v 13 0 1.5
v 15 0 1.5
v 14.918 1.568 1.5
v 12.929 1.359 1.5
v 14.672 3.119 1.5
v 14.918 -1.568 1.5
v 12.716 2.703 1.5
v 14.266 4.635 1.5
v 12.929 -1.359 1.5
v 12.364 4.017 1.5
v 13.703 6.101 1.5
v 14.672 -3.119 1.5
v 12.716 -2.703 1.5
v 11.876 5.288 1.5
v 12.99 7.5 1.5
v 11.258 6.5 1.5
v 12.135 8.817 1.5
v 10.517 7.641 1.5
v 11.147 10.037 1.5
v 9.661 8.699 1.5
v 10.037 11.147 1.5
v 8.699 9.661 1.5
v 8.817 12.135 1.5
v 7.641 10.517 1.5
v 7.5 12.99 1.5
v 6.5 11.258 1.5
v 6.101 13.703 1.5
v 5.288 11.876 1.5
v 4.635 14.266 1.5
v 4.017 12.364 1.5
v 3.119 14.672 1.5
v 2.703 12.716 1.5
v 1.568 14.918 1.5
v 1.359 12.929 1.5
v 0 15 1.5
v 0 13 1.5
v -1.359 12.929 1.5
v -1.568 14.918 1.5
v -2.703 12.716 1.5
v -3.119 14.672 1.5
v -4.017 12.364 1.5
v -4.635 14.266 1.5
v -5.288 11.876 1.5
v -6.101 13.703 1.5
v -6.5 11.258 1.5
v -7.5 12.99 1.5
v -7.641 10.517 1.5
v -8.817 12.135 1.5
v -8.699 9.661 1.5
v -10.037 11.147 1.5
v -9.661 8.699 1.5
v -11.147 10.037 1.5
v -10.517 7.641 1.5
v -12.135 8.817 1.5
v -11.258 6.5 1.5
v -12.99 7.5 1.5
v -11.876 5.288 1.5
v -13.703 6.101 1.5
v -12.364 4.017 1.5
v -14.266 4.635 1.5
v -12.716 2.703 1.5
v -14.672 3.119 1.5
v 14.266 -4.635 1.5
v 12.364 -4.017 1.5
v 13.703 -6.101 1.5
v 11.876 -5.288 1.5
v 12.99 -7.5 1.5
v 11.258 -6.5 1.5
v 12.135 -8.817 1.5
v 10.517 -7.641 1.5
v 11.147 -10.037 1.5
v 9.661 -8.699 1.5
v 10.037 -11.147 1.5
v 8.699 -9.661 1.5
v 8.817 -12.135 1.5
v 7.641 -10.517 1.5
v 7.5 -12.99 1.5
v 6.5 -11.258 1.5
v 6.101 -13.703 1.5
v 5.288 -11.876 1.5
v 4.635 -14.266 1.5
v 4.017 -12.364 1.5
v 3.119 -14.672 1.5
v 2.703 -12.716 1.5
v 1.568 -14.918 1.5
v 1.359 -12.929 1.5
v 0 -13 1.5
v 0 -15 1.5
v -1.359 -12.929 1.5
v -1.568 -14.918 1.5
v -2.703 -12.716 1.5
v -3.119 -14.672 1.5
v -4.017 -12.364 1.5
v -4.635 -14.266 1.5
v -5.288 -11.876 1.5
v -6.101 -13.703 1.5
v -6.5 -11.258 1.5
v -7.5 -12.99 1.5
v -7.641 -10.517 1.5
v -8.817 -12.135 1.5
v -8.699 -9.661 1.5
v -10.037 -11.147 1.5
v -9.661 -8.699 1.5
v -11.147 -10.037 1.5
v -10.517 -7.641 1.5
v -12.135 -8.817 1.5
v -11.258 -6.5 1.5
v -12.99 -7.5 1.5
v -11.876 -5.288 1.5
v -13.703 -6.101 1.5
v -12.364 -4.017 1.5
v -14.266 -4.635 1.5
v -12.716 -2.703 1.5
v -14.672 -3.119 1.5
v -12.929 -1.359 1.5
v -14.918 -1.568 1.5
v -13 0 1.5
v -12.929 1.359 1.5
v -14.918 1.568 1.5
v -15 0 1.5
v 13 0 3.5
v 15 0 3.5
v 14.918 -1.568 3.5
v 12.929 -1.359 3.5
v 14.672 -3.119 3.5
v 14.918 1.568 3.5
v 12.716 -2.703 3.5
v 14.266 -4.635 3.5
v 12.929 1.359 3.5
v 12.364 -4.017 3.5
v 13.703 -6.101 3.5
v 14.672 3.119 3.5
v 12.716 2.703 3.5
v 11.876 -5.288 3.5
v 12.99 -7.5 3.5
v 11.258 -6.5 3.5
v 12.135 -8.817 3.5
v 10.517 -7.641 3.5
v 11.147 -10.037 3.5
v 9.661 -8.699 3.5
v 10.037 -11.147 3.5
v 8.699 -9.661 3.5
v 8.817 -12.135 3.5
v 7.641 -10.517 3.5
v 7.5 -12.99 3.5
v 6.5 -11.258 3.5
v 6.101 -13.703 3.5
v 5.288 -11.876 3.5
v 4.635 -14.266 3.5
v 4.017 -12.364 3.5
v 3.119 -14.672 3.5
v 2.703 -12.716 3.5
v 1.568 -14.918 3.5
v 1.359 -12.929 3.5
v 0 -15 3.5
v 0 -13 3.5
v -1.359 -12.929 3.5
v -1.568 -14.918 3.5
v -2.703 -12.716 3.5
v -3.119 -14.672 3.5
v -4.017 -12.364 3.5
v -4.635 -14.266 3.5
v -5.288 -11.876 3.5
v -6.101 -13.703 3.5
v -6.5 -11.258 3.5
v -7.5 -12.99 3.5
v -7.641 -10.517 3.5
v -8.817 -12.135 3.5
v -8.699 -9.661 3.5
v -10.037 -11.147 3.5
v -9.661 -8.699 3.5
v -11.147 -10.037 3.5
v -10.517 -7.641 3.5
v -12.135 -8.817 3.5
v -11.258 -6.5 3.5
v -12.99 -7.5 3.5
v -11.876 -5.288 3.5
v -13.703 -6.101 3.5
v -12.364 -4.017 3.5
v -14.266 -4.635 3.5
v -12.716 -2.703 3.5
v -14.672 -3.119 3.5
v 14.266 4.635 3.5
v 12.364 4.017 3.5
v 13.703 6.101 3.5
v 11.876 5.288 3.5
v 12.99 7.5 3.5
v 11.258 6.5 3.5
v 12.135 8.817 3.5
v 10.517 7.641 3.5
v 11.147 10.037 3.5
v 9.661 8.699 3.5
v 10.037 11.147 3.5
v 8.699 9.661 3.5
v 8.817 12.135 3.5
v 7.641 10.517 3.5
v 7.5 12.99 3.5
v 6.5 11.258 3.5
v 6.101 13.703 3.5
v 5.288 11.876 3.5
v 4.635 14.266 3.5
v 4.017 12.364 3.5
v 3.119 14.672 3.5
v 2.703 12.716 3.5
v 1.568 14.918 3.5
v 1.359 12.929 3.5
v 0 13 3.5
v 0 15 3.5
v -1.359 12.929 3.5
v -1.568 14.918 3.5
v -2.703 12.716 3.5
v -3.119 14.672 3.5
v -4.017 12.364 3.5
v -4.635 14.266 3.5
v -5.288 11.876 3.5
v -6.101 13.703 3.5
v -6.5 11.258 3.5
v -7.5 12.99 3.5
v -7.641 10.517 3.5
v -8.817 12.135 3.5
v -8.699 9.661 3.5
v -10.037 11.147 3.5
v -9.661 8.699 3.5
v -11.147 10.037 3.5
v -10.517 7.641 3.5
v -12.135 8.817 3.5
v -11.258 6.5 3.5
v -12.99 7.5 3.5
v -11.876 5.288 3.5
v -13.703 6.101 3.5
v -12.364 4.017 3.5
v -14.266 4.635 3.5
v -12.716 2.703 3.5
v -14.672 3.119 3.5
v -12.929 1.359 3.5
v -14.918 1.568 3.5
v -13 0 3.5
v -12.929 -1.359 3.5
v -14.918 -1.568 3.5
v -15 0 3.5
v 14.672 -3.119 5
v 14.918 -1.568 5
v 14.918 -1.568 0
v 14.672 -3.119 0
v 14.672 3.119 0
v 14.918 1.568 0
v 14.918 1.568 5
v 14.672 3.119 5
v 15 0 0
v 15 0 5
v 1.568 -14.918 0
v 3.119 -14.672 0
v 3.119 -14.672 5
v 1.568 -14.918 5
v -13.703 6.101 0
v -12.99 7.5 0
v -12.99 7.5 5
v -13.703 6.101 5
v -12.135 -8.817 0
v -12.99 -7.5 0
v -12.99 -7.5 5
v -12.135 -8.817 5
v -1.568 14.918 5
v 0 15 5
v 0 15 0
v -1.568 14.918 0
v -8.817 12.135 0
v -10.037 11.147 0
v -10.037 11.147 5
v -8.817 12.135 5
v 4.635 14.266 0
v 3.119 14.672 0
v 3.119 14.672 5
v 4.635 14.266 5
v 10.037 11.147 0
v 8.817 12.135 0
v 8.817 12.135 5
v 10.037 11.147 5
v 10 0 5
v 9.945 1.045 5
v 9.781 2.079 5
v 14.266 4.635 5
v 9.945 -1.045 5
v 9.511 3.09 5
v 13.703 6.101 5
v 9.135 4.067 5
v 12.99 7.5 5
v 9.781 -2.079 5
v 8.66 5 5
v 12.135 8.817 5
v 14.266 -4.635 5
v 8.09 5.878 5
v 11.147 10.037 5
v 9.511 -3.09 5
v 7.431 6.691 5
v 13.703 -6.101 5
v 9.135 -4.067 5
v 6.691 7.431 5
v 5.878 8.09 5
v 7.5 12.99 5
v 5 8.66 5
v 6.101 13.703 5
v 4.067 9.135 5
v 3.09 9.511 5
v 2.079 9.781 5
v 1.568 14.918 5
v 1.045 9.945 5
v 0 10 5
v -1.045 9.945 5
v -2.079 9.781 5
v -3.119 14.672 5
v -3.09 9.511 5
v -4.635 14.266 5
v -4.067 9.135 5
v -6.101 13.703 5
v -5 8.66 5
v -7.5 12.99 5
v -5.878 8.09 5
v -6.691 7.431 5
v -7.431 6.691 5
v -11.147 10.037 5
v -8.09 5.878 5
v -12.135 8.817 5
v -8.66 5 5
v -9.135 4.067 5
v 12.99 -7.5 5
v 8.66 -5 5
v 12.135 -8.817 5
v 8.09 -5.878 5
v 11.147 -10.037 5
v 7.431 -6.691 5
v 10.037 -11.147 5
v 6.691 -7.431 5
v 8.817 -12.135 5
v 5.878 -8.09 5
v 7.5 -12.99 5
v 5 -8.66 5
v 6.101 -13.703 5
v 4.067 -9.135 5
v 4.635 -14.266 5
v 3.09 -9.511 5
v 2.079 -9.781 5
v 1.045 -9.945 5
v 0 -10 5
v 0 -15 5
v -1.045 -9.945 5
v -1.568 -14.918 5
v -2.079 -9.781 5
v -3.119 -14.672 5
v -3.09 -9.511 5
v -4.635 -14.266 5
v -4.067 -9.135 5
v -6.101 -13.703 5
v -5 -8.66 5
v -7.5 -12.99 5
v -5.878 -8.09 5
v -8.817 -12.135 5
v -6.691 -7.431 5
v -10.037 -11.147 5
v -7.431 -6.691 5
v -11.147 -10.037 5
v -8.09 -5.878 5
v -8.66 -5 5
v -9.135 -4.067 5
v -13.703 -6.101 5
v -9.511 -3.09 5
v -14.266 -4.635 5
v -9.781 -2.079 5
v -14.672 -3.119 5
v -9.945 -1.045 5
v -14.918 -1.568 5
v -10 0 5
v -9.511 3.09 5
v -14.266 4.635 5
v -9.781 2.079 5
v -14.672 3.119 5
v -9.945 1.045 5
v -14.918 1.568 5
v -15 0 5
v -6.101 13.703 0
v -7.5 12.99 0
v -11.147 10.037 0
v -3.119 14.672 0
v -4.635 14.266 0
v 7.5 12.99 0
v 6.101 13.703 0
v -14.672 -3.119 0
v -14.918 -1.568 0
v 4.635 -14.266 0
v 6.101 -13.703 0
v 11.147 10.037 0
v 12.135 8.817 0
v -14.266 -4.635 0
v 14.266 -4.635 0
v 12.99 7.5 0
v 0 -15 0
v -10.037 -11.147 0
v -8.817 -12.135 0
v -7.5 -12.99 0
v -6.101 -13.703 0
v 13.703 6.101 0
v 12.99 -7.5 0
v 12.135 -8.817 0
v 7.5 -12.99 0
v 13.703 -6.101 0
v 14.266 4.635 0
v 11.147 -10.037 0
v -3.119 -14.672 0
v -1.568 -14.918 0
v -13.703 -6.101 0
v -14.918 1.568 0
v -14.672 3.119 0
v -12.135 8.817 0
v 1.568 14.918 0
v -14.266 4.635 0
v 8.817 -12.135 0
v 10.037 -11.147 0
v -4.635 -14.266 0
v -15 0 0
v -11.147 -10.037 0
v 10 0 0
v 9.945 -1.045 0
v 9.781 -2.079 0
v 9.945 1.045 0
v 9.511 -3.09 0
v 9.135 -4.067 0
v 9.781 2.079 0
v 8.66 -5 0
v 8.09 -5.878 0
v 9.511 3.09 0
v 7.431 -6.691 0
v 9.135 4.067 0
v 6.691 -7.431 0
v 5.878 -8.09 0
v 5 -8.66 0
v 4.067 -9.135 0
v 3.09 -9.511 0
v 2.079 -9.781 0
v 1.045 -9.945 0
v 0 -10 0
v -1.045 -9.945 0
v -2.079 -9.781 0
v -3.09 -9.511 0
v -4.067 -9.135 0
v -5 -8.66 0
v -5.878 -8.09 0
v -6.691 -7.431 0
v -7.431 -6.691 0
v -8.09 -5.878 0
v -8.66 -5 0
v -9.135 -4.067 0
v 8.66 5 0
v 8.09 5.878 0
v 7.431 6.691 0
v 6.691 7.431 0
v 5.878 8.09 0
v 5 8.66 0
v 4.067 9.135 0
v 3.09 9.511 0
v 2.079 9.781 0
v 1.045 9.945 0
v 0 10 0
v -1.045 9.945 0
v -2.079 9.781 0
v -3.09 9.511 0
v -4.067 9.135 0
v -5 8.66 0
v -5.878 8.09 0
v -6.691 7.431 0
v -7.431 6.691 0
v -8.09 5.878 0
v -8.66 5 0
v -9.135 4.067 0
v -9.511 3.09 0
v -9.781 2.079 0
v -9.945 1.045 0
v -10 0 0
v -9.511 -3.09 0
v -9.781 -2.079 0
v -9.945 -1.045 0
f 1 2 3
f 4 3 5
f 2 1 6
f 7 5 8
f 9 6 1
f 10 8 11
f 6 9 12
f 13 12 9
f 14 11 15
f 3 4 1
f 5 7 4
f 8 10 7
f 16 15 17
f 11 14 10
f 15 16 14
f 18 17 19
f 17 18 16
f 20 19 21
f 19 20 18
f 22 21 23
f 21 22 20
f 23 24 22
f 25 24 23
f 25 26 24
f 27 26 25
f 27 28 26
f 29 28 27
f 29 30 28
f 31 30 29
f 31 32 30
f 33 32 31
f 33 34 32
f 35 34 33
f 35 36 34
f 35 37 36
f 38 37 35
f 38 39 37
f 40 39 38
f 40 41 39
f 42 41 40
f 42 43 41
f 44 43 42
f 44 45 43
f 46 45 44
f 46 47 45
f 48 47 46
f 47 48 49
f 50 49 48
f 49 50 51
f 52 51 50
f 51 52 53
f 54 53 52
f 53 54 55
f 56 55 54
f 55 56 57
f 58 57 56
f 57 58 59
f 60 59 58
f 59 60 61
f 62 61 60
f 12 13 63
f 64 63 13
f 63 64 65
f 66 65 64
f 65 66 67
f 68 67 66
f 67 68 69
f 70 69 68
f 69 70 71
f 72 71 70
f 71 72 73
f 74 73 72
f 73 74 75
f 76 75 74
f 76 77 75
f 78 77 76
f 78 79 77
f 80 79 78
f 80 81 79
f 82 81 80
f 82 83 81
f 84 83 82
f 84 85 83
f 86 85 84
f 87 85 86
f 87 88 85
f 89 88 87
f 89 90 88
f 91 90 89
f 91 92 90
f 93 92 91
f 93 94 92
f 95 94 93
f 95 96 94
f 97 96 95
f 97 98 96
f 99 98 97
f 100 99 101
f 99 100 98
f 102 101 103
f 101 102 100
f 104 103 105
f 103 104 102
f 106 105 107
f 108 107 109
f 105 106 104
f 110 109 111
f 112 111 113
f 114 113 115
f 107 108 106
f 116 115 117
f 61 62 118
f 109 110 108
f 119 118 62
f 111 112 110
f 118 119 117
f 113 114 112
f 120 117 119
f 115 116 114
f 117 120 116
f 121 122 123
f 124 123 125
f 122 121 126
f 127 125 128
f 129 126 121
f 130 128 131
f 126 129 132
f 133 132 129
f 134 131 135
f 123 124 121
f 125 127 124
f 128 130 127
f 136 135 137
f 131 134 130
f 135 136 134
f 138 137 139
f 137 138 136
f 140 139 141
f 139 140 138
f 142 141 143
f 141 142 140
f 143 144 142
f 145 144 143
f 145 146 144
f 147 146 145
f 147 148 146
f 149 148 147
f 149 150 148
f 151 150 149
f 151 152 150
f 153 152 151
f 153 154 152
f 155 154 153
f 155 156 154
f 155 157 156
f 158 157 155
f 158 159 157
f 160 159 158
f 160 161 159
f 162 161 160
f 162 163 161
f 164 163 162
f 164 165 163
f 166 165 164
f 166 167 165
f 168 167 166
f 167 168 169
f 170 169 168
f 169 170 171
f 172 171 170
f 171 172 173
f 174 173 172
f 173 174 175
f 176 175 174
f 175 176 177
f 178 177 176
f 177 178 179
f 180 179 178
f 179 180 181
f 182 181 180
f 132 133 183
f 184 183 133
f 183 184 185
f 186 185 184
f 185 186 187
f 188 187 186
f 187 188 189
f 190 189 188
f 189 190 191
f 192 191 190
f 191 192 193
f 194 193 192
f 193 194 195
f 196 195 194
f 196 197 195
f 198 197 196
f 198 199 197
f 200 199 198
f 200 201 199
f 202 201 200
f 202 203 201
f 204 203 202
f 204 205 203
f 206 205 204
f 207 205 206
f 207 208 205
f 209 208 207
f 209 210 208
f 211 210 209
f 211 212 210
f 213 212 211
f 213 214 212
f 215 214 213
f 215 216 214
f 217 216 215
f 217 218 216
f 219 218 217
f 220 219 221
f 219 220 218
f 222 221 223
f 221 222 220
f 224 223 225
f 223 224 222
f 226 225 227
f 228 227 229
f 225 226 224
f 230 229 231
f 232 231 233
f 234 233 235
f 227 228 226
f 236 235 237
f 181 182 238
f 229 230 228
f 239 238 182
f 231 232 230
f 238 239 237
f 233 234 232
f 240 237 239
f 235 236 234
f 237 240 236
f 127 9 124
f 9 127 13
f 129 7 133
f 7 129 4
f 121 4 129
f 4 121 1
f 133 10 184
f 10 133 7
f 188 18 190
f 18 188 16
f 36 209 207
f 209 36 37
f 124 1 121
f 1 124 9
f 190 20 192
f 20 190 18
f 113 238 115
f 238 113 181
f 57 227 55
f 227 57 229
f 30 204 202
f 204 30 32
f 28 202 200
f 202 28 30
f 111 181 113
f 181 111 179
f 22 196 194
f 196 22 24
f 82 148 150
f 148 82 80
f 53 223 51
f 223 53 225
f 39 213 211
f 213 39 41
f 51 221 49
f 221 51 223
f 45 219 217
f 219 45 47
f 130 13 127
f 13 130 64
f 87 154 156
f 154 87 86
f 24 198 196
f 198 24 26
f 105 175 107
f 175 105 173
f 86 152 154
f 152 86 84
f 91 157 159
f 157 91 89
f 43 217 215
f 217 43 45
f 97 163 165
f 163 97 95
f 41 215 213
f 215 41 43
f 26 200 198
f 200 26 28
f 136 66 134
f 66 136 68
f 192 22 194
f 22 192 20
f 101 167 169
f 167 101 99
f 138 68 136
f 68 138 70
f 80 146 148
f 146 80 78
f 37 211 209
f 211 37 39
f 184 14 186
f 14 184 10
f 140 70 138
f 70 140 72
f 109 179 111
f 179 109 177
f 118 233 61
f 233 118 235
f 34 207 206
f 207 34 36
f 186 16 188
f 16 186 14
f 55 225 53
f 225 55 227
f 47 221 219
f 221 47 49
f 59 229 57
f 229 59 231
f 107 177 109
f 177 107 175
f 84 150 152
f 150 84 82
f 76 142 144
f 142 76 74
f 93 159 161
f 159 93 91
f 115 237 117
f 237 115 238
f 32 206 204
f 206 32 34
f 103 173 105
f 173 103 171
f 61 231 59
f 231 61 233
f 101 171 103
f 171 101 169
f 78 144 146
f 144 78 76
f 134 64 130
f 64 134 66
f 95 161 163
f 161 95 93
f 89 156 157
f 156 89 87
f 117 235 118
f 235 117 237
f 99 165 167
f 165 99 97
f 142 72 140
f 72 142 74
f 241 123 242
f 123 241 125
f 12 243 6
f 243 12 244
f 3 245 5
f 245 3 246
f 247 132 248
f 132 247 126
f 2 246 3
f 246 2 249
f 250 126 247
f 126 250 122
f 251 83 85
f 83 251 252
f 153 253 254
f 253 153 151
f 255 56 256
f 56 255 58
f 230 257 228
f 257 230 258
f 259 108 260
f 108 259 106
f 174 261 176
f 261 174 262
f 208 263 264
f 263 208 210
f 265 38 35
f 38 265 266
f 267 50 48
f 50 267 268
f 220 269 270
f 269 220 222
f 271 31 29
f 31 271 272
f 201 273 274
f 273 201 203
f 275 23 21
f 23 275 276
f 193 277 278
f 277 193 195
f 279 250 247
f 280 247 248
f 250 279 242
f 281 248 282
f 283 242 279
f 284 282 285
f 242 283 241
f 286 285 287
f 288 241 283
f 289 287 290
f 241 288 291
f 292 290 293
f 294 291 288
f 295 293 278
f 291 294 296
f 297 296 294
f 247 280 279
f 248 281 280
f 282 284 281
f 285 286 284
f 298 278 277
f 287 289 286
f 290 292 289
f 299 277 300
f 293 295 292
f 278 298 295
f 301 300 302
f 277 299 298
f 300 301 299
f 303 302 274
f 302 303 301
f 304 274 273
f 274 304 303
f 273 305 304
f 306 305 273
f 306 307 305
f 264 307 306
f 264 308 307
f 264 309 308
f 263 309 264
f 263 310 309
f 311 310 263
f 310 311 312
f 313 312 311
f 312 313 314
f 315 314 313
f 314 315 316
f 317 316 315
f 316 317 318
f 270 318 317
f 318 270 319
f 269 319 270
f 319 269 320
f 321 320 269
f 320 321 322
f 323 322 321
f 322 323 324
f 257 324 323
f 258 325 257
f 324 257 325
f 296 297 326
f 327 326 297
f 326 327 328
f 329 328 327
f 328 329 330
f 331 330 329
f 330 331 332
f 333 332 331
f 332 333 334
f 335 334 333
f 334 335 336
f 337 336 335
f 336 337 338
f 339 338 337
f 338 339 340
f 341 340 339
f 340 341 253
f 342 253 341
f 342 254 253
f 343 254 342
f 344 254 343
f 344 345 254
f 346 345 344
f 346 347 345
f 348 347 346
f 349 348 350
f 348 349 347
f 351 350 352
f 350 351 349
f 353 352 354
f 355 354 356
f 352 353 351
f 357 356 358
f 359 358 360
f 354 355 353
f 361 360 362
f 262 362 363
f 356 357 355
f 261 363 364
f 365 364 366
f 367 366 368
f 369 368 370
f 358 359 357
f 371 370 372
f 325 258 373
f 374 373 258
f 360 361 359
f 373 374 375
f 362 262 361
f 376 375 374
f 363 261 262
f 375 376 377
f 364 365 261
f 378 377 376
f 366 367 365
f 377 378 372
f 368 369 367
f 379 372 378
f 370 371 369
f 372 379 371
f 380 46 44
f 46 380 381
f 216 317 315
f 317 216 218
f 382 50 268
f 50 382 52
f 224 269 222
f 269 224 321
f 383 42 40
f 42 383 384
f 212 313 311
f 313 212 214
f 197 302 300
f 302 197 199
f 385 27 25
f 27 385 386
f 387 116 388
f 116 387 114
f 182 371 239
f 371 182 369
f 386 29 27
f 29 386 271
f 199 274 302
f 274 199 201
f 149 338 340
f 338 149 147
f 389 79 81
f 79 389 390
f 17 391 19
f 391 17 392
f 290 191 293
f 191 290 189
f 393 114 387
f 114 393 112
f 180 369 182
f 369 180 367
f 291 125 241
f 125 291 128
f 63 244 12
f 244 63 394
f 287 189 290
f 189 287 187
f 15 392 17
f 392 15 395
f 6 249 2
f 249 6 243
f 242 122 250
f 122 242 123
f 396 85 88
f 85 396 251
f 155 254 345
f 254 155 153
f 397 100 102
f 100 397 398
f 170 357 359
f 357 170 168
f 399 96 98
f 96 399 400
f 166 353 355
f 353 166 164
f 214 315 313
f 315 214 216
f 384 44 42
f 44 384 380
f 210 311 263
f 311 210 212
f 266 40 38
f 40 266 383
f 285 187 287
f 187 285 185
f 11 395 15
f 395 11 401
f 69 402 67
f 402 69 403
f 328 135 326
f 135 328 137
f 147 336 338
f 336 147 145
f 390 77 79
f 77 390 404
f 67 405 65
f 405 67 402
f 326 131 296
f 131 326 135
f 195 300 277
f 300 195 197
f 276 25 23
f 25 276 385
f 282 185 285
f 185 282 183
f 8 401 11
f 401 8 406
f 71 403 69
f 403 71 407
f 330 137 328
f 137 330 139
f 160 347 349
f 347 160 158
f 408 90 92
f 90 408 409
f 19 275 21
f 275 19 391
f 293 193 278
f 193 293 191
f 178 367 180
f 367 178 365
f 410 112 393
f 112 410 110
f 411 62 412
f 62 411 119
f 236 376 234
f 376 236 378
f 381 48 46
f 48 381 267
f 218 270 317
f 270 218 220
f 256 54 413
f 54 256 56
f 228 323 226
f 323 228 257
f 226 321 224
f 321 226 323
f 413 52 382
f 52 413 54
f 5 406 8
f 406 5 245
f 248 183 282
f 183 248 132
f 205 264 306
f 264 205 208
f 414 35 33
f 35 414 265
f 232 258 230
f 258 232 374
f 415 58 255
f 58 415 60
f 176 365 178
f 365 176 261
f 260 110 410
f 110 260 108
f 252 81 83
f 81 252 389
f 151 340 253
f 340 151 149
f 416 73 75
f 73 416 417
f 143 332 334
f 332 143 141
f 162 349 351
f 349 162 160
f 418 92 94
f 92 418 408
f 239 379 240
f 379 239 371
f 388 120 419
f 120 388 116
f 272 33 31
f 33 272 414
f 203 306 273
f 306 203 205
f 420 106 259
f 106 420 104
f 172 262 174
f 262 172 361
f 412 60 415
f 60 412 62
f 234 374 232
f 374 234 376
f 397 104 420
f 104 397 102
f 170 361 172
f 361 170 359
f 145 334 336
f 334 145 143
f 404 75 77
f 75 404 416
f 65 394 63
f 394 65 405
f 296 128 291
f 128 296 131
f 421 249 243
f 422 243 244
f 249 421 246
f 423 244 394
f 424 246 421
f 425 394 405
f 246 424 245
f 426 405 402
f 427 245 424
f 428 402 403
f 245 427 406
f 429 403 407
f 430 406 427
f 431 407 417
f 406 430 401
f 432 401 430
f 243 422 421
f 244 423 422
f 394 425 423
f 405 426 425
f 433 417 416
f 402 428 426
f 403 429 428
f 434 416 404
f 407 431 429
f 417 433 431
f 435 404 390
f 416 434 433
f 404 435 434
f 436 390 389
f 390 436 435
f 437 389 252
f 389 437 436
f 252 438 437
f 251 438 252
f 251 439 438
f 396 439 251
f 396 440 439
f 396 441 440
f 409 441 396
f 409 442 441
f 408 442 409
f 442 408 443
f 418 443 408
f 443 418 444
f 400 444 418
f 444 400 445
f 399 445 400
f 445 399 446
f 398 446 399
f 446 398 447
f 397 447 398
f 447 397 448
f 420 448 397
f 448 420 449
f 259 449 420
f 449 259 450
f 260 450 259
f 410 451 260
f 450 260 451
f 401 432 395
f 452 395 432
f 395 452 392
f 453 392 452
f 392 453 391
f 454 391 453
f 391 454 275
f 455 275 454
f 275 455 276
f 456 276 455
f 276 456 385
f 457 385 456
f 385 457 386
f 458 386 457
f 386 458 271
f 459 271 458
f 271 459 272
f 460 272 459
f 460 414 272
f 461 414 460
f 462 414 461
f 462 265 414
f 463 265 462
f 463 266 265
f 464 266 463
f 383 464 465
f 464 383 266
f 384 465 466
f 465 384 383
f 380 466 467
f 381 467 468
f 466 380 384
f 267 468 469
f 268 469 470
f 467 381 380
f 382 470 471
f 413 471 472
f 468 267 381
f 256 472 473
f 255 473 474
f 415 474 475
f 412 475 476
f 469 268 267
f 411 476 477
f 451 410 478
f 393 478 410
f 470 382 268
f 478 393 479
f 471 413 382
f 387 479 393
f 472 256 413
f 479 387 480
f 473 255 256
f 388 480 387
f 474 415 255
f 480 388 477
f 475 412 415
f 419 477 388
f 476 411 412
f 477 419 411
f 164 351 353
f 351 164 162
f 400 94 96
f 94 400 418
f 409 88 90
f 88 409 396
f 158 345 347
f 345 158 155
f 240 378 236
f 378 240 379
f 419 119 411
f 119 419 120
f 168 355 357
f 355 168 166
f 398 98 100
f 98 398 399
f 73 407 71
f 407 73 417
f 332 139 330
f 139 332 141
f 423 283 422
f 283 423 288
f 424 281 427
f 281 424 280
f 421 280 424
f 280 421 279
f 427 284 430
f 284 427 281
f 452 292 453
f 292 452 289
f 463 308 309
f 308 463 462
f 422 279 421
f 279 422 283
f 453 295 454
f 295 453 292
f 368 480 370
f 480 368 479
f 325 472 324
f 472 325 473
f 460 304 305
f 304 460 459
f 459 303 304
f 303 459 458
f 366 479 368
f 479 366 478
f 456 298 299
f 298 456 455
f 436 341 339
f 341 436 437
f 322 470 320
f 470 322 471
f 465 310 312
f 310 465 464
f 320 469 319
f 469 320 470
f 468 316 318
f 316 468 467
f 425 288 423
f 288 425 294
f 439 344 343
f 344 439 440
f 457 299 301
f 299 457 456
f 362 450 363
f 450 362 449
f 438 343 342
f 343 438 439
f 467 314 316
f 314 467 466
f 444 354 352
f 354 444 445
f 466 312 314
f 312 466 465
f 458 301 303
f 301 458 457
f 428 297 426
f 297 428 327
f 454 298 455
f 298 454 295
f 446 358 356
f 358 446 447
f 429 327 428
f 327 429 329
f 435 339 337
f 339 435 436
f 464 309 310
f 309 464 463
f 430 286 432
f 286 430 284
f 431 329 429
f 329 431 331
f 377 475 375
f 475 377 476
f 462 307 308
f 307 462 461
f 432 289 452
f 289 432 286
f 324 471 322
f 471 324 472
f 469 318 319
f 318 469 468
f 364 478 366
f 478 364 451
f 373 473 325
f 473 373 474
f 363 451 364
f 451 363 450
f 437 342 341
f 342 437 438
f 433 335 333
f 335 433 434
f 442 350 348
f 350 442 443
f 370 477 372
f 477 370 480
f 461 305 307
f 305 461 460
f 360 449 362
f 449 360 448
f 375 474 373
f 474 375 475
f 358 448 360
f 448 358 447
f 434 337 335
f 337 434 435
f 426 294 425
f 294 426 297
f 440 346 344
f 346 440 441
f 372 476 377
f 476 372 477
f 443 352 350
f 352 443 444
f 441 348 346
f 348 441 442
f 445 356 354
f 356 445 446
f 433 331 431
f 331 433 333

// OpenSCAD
$fn=60;
difference(){
    cylinder(r=15,h=5);
    translate([0,0,1.5]) difference() {
        cylinder(r=16,h=2);
        translate([0,0,-1]) cylinder(r=13,h=5);
    }
    translate([0,0,-1]) cylinder(r=10,h=7);
    
}
